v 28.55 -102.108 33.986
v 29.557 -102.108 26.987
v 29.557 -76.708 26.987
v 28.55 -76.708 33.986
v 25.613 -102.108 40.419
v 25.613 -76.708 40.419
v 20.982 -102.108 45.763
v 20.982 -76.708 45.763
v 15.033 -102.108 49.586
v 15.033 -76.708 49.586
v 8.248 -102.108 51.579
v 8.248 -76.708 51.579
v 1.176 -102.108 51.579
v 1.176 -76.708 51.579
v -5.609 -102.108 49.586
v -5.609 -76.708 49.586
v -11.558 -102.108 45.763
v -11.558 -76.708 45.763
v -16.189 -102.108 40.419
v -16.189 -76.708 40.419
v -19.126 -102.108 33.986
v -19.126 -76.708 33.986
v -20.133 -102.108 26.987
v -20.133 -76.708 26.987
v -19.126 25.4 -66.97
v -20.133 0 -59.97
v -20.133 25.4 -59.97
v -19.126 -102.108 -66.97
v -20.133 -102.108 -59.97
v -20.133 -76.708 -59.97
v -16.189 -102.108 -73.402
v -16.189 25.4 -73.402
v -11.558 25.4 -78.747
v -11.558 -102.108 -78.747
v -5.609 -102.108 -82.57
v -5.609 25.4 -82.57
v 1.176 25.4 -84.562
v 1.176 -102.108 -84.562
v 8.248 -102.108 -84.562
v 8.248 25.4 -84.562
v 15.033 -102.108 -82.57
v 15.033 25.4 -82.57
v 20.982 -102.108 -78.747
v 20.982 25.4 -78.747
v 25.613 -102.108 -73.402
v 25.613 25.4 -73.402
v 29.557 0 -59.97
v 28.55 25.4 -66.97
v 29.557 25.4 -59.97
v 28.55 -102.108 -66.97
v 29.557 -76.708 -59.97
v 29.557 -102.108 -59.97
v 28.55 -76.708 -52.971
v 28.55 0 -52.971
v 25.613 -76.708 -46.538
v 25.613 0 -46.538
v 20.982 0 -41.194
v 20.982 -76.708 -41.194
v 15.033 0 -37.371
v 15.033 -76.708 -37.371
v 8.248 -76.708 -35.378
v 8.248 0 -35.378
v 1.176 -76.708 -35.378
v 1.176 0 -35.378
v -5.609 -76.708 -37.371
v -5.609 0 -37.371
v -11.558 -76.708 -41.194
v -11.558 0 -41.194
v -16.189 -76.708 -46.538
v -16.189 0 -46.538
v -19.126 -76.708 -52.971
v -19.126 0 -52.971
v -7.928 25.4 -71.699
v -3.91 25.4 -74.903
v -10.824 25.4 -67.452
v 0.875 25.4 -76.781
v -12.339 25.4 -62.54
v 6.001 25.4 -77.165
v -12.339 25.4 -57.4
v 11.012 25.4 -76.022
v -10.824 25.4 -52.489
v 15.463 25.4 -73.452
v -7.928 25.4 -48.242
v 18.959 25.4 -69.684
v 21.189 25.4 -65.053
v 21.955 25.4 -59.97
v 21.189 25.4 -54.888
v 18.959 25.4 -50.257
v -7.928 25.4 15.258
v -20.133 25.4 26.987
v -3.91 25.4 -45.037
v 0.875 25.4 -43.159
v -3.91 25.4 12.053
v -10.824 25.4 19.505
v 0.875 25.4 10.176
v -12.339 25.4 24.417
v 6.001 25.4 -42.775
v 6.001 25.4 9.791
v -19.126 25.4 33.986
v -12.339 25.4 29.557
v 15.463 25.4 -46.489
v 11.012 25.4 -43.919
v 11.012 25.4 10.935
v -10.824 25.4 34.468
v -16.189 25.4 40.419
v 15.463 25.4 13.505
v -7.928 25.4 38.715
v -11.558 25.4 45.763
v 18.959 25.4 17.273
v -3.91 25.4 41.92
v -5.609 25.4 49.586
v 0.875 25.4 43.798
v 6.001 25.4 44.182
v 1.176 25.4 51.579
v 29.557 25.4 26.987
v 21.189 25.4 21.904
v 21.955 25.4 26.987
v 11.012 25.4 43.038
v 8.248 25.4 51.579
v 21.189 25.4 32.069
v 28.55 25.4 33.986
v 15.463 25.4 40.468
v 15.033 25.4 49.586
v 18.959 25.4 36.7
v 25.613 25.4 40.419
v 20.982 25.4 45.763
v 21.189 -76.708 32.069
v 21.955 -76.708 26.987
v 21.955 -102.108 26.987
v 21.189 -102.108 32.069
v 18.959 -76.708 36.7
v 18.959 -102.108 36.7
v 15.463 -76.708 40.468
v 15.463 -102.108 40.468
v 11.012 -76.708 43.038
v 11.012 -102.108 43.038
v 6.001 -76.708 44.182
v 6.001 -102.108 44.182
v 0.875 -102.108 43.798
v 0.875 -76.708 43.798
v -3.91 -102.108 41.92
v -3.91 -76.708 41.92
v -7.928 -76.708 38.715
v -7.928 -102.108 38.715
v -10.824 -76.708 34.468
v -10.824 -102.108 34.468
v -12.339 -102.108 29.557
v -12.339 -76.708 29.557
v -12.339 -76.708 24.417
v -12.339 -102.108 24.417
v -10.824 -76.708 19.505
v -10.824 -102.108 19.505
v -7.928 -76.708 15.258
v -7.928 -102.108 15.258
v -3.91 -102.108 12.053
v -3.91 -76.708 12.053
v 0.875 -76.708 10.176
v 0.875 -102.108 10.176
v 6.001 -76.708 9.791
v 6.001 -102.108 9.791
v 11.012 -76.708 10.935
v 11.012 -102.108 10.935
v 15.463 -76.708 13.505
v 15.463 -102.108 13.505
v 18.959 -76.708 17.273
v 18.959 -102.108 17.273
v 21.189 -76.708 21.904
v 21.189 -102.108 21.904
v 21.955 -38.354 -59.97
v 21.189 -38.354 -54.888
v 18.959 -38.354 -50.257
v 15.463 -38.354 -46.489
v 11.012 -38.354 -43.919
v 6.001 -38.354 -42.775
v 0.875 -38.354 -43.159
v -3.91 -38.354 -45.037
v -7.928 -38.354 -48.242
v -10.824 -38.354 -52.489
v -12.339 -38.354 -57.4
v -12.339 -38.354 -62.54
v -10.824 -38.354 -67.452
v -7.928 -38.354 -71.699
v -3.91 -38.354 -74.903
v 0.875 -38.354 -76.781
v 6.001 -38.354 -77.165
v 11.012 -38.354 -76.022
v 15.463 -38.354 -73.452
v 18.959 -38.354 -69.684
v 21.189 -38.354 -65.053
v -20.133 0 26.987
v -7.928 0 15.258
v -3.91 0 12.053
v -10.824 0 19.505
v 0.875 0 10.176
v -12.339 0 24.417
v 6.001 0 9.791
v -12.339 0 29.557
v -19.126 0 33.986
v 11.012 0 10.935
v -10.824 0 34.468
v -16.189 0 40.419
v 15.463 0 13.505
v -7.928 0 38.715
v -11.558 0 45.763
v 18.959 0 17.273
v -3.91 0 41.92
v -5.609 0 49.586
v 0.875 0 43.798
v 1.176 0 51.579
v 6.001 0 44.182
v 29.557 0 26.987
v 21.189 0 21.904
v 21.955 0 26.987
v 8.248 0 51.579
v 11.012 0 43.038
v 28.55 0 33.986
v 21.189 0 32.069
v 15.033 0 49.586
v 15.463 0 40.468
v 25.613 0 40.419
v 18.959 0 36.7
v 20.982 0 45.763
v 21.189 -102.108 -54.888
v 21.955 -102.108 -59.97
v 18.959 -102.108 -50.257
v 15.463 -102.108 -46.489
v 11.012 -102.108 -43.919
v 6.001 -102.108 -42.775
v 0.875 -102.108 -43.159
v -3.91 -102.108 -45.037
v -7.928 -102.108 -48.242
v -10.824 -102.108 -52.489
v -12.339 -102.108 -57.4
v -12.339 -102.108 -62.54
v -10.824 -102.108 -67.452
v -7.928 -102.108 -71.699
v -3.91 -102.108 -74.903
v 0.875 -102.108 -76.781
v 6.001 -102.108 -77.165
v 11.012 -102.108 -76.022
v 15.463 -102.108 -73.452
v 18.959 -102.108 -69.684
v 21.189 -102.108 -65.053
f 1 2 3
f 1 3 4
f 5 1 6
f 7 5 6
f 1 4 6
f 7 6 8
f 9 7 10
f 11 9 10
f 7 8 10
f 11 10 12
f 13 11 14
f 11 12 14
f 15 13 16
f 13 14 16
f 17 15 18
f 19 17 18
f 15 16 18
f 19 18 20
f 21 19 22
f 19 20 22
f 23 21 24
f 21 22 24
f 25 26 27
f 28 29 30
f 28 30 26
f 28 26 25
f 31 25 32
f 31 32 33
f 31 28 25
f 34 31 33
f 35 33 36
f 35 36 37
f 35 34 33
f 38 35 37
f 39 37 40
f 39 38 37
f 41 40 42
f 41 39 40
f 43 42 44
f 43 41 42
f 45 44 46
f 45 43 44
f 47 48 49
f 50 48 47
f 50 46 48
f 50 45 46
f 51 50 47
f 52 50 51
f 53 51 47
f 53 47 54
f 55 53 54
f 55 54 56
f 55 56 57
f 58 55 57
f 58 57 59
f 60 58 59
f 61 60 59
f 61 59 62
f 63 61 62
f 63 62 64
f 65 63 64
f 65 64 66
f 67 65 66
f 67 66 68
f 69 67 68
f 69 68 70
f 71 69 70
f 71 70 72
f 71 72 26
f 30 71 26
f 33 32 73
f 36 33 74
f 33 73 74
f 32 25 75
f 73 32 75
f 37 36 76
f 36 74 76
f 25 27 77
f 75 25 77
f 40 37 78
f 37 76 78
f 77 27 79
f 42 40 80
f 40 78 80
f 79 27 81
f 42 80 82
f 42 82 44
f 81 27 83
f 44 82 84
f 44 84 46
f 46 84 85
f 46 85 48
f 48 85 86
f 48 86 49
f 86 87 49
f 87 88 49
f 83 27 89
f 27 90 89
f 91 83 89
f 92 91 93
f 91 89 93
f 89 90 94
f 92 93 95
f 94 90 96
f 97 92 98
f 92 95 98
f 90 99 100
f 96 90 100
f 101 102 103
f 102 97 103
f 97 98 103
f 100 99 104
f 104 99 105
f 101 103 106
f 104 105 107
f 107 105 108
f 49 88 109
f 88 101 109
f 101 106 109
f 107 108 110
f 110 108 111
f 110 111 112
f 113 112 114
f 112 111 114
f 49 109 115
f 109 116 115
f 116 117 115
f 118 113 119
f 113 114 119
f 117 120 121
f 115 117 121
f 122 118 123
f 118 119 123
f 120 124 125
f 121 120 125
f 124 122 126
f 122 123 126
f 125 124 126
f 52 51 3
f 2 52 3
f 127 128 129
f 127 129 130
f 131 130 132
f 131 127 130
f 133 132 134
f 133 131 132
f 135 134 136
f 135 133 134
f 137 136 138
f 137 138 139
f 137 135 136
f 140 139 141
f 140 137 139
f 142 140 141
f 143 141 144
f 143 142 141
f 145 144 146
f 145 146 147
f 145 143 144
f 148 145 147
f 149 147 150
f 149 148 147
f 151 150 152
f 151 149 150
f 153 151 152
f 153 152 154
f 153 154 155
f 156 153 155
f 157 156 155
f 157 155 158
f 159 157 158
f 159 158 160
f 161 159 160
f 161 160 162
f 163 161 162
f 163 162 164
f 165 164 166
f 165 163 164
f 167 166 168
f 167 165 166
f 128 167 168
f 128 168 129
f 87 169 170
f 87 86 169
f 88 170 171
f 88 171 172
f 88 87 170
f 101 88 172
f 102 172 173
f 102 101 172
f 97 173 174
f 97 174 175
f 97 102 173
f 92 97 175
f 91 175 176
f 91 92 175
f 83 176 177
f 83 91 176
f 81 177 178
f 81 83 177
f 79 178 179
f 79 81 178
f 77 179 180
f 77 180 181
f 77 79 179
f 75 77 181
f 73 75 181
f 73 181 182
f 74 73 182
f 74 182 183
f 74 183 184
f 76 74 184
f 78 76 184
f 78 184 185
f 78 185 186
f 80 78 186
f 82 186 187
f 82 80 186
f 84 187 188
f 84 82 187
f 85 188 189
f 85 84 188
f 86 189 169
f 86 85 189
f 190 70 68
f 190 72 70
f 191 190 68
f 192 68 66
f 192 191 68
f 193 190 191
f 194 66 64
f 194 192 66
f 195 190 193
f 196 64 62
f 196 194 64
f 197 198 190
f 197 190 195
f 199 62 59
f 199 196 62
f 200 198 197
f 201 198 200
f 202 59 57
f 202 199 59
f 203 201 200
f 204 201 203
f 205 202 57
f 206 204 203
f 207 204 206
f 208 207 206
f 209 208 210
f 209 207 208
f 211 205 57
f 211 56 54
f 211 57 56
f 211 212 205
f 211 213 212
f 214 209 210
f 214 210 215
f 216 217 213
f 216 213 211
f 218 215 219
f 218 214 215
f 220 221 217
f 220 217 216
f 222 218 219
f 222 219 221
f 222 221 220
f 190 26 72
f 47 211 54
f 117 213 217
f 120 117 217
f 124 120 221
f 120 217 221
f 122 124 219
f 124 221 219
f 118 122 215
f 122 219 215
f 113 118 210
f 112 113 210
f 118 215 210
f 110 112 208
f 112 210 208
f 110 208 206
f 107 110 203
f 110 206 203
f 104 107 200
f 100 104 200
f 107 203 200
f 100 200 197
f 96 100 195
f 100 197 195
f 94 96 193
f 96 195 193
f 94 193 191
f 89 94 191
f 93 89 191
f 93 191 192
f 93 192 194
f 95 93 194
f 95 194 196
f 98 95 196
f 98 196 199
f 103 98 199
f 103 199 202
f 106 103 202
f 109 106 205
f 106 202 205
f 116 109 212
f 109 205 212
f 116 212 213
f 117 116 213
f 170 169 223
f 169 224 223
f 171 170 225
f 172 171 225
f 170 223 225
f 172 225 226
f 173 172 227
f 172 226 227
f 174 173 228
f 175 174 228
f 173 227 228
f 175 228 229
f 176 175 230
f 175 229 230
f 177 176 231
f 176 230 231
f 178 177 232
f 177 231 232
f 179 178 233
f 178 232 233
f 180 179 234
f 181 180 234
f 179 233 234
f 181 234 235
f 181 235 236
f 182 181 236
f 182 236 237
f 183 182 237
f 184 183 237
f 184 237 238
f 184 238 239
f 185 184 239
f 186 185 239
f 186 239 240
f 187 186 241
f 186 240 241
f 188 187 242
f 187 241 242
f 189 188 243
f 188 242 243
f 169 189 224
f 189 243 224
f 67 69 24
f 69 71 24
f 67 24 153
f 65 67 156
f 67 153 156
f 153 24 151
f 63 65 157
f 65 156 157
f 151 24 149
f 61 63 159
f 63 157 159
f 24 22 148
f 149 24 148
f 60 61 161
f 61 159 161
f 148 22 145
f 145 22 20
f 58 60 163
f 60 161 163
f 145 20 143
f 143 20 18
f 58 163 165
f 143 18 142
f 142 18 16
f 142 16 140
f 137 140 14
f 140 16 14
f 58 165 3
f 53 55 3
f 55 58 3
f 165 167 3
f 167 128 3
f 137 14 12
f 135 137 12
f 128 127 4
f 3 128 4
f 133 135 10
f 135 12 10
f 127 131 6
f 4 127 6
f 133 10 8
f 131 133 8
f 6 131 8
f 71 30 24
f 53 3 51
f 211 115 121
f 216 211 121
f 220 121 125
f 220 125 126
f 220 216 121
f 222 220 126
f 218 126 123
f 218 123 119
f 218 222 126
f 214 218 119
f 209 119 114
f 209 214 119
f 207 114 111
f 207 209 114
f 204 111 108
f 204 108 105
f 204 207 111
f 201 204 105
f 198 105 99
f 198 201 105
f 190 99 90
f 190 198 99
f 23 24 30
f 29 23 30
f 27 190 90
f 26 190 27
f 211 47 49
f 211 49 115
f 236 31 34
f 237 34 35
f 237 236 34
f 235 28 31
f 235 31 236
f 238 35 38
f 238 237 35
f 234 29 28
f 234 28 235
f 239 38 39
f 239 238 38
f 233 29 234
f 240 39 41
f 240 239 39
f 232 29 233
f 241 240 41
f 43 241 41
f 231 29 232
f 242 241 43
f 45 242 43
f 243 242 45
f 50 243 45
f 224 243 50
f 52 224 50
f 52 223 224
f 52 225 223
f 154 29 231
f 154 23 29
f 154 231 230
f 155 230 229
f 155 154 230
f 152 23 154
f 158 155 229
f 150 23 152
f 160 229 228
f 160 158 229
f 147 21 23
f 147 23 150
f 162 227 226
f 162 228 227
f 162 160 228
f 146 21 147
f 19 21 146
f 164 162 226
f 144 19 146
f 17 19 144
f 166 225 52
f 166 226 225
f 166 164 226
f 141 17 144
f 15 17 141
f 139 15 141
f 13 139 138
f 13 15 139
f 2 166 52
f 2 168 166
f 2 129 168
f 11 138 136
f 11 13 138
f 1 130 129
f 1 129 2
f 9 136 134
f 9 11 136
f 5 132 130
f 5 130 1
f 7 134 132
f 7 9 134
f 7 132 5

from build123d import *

# Parameters (mm, degrees)
F0_R     = 17.243365
F1_DEPTH = 25.4
F2_DEPTH = 38.354


with BuildPart() as f1:
    # F0 (on Front) → F1 (new body)
    with BuildSketch(Plane.XZ):
        with BuildLine():
            ThreePointArc((29.55677, -59.970262), (4.711947, -35.125439), (-20.132875, -59.970262))
            ThreePointArc((-20.132875, -59.970262), (4.711947, -84.815084), (29.55677, -59.970262))
        make_face()
        with Locations((4.711947, -59.970262)):
            Circle(F0_R, mode=Mode.SUBTRACT)
        with BuildLine():
            ThreePointArc((29.55677, 26.986618), (4.711947, 2.141795), (-20.132875, 26.986618))
            Line((-20.132875, 26.986618), (-20.132875, -59.970262))
            ThreePointArc((-20.132875, -59.970262), (4.711947, -35.125439), (29.55677, -59.970262))
            Line((29.55677, -59.970262), (29.55677, 26.986618))
        make_face()
        with BuildLine():
            ThreePointArc((29.55677, 26.986618), (4.711947, 51.83144), (-20.132875, 26.986618))
            ThreePointArc((-20.132875, 26.986618), (4.711947, 2.141795), (29.55677, 26.986618))
        make_face()
        with Locations((4.711947, 26.986618)):
            Circle(F0_R, mode=Mode.SUBTRACT)
    extrude(amount=-F1_DEPTH)

    # F0 (on Front) → F2 (join)
    with BuildSketch(Plane.XZ):
        with BuildLine():
            ThreePointArc((29.55677, -59.970262), (4.711947, -35.125439), (-20.132875, -59.970262))
            ThreePointArc((-20.132875, -59.970262), (4.711947, -84.815084), (29.55677, -59.970262))
        make_face()
        with Locations((4.711947, -59.970262)):
            Circle(F0_R, mode=Mode.SUBTRACT)
    extrude(amount=F2_DEPTH)

    # F3: F1 across face


with BuildPart() as f1_1:
    add(f1.part)
    add(f1.part.mirror(Plane(origin=(4.711947, -38.354, -59.970262), x_dir=(1, 0, 0), z_dir=(0, -1, 0))))


solid = f1_1.part
